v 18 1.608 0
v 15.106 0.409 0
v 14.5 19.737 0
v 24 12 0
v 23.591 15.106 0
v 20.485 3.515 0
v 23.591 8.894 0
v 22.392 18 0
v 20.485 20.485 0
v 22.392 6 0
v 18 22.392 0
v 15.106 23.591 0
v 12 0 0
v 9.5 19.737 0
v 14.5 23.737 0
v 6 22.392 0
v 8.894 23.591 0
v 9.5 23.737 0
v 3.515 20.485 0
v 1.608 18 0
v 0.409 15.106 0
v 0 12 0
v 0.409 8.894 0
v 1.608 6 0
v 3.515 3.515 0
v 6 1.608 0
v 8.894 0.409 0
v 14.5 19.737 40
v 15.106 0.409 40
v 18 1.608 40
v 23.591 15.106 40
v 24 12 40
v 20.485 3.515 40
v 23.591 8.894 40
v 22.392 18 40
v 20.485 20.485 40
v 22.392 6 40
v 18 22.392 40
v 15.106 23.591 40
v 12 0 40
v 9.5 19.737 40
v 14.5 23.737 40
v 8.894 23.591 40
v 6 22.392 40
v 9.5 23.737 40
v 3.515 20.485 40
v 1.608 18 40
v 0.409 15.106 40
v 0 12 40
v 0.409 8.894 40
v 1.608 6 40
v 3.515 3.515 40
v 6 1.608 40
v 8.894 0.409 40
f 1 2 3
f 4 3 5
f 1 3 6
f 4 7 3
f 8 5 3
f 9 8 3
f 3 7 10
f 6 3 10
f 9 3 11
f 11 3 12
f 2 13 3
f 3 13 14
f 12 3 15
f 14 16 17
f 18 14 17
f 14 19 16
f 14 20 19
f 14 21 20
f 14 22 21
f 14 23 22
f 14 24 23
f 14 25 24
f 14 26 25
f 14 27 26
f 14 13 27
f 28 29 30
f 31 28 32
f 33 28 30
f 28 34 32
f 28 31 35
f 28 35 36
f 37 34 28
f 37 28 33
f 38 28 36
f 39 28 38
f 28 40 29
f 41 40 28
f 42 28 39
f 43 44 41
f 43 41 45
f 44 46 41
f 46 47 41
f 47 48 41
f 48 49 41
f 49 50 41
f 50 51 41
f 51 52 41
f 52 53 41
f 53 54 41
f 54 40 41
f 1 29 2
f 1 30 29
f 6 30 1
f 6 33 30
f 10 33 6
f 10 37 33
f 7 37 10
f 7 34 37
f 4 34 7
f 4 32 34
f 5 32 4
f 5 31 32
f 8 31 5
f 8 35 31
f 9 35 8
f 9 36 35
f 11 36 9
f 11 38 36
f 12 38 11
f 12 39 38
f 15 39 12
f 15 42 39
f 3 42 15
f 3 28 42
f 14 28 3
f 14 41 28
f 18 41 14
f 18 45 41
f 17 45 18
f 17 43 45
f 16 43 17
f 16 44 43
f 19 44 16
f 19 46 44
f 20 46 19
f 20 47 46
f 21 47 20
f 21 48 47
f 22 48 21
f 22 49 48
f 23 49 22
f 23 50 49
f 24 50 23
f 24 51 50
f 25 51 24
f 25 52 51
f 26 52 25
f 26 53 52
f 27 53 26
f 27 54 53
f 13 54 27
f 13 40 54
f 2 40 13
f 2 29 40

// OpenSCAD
$fn = 32;

// ----------------------------------------------------------------------
// Keyway shaft: d24 shaft, key 5 x 4 mm
// ----------------------------------------------------------------------

// --- parameters (mm) ---
shaft_r = 12;             // shaft radius
key_w = 5;                // keyway width
key_d = 4;                // keyway depth below the surface line
plate_t = 40;             // shaft length, Z (extrusion height)

shaft_d = 2 * shaft_r;  // shaft diameter
circle_step = 15;  // polygon sampling step, degrees

profile = [[8.894, 23.591], [6, 22.392], [3.515, 20.485], [1.608, 18], [0.409, 15.106], [0, 12], [0.409, 8.894], [1.608, 6], [3.515, 3.515], [6, 1.608], [8.894, 0.409], [12, 0], [15.106, 0.409], [18, 1.608], [20.485, 3.515], [22.392, 6], [23.591, 8.894], [24, 12], [23.591, 15.106], [22.392, 18], [20.485, 20.485], [18, 22.392], [15.106, 23.591], [14.5, 23.737], [14.5, 19.737], [9.5, 19.737], [9.5, 23.737]];  // primary outline, 27 points, counter clockwise

// --- the one profile operation ---
linear_extrude(height = plate_t) polygon(points = profile);
